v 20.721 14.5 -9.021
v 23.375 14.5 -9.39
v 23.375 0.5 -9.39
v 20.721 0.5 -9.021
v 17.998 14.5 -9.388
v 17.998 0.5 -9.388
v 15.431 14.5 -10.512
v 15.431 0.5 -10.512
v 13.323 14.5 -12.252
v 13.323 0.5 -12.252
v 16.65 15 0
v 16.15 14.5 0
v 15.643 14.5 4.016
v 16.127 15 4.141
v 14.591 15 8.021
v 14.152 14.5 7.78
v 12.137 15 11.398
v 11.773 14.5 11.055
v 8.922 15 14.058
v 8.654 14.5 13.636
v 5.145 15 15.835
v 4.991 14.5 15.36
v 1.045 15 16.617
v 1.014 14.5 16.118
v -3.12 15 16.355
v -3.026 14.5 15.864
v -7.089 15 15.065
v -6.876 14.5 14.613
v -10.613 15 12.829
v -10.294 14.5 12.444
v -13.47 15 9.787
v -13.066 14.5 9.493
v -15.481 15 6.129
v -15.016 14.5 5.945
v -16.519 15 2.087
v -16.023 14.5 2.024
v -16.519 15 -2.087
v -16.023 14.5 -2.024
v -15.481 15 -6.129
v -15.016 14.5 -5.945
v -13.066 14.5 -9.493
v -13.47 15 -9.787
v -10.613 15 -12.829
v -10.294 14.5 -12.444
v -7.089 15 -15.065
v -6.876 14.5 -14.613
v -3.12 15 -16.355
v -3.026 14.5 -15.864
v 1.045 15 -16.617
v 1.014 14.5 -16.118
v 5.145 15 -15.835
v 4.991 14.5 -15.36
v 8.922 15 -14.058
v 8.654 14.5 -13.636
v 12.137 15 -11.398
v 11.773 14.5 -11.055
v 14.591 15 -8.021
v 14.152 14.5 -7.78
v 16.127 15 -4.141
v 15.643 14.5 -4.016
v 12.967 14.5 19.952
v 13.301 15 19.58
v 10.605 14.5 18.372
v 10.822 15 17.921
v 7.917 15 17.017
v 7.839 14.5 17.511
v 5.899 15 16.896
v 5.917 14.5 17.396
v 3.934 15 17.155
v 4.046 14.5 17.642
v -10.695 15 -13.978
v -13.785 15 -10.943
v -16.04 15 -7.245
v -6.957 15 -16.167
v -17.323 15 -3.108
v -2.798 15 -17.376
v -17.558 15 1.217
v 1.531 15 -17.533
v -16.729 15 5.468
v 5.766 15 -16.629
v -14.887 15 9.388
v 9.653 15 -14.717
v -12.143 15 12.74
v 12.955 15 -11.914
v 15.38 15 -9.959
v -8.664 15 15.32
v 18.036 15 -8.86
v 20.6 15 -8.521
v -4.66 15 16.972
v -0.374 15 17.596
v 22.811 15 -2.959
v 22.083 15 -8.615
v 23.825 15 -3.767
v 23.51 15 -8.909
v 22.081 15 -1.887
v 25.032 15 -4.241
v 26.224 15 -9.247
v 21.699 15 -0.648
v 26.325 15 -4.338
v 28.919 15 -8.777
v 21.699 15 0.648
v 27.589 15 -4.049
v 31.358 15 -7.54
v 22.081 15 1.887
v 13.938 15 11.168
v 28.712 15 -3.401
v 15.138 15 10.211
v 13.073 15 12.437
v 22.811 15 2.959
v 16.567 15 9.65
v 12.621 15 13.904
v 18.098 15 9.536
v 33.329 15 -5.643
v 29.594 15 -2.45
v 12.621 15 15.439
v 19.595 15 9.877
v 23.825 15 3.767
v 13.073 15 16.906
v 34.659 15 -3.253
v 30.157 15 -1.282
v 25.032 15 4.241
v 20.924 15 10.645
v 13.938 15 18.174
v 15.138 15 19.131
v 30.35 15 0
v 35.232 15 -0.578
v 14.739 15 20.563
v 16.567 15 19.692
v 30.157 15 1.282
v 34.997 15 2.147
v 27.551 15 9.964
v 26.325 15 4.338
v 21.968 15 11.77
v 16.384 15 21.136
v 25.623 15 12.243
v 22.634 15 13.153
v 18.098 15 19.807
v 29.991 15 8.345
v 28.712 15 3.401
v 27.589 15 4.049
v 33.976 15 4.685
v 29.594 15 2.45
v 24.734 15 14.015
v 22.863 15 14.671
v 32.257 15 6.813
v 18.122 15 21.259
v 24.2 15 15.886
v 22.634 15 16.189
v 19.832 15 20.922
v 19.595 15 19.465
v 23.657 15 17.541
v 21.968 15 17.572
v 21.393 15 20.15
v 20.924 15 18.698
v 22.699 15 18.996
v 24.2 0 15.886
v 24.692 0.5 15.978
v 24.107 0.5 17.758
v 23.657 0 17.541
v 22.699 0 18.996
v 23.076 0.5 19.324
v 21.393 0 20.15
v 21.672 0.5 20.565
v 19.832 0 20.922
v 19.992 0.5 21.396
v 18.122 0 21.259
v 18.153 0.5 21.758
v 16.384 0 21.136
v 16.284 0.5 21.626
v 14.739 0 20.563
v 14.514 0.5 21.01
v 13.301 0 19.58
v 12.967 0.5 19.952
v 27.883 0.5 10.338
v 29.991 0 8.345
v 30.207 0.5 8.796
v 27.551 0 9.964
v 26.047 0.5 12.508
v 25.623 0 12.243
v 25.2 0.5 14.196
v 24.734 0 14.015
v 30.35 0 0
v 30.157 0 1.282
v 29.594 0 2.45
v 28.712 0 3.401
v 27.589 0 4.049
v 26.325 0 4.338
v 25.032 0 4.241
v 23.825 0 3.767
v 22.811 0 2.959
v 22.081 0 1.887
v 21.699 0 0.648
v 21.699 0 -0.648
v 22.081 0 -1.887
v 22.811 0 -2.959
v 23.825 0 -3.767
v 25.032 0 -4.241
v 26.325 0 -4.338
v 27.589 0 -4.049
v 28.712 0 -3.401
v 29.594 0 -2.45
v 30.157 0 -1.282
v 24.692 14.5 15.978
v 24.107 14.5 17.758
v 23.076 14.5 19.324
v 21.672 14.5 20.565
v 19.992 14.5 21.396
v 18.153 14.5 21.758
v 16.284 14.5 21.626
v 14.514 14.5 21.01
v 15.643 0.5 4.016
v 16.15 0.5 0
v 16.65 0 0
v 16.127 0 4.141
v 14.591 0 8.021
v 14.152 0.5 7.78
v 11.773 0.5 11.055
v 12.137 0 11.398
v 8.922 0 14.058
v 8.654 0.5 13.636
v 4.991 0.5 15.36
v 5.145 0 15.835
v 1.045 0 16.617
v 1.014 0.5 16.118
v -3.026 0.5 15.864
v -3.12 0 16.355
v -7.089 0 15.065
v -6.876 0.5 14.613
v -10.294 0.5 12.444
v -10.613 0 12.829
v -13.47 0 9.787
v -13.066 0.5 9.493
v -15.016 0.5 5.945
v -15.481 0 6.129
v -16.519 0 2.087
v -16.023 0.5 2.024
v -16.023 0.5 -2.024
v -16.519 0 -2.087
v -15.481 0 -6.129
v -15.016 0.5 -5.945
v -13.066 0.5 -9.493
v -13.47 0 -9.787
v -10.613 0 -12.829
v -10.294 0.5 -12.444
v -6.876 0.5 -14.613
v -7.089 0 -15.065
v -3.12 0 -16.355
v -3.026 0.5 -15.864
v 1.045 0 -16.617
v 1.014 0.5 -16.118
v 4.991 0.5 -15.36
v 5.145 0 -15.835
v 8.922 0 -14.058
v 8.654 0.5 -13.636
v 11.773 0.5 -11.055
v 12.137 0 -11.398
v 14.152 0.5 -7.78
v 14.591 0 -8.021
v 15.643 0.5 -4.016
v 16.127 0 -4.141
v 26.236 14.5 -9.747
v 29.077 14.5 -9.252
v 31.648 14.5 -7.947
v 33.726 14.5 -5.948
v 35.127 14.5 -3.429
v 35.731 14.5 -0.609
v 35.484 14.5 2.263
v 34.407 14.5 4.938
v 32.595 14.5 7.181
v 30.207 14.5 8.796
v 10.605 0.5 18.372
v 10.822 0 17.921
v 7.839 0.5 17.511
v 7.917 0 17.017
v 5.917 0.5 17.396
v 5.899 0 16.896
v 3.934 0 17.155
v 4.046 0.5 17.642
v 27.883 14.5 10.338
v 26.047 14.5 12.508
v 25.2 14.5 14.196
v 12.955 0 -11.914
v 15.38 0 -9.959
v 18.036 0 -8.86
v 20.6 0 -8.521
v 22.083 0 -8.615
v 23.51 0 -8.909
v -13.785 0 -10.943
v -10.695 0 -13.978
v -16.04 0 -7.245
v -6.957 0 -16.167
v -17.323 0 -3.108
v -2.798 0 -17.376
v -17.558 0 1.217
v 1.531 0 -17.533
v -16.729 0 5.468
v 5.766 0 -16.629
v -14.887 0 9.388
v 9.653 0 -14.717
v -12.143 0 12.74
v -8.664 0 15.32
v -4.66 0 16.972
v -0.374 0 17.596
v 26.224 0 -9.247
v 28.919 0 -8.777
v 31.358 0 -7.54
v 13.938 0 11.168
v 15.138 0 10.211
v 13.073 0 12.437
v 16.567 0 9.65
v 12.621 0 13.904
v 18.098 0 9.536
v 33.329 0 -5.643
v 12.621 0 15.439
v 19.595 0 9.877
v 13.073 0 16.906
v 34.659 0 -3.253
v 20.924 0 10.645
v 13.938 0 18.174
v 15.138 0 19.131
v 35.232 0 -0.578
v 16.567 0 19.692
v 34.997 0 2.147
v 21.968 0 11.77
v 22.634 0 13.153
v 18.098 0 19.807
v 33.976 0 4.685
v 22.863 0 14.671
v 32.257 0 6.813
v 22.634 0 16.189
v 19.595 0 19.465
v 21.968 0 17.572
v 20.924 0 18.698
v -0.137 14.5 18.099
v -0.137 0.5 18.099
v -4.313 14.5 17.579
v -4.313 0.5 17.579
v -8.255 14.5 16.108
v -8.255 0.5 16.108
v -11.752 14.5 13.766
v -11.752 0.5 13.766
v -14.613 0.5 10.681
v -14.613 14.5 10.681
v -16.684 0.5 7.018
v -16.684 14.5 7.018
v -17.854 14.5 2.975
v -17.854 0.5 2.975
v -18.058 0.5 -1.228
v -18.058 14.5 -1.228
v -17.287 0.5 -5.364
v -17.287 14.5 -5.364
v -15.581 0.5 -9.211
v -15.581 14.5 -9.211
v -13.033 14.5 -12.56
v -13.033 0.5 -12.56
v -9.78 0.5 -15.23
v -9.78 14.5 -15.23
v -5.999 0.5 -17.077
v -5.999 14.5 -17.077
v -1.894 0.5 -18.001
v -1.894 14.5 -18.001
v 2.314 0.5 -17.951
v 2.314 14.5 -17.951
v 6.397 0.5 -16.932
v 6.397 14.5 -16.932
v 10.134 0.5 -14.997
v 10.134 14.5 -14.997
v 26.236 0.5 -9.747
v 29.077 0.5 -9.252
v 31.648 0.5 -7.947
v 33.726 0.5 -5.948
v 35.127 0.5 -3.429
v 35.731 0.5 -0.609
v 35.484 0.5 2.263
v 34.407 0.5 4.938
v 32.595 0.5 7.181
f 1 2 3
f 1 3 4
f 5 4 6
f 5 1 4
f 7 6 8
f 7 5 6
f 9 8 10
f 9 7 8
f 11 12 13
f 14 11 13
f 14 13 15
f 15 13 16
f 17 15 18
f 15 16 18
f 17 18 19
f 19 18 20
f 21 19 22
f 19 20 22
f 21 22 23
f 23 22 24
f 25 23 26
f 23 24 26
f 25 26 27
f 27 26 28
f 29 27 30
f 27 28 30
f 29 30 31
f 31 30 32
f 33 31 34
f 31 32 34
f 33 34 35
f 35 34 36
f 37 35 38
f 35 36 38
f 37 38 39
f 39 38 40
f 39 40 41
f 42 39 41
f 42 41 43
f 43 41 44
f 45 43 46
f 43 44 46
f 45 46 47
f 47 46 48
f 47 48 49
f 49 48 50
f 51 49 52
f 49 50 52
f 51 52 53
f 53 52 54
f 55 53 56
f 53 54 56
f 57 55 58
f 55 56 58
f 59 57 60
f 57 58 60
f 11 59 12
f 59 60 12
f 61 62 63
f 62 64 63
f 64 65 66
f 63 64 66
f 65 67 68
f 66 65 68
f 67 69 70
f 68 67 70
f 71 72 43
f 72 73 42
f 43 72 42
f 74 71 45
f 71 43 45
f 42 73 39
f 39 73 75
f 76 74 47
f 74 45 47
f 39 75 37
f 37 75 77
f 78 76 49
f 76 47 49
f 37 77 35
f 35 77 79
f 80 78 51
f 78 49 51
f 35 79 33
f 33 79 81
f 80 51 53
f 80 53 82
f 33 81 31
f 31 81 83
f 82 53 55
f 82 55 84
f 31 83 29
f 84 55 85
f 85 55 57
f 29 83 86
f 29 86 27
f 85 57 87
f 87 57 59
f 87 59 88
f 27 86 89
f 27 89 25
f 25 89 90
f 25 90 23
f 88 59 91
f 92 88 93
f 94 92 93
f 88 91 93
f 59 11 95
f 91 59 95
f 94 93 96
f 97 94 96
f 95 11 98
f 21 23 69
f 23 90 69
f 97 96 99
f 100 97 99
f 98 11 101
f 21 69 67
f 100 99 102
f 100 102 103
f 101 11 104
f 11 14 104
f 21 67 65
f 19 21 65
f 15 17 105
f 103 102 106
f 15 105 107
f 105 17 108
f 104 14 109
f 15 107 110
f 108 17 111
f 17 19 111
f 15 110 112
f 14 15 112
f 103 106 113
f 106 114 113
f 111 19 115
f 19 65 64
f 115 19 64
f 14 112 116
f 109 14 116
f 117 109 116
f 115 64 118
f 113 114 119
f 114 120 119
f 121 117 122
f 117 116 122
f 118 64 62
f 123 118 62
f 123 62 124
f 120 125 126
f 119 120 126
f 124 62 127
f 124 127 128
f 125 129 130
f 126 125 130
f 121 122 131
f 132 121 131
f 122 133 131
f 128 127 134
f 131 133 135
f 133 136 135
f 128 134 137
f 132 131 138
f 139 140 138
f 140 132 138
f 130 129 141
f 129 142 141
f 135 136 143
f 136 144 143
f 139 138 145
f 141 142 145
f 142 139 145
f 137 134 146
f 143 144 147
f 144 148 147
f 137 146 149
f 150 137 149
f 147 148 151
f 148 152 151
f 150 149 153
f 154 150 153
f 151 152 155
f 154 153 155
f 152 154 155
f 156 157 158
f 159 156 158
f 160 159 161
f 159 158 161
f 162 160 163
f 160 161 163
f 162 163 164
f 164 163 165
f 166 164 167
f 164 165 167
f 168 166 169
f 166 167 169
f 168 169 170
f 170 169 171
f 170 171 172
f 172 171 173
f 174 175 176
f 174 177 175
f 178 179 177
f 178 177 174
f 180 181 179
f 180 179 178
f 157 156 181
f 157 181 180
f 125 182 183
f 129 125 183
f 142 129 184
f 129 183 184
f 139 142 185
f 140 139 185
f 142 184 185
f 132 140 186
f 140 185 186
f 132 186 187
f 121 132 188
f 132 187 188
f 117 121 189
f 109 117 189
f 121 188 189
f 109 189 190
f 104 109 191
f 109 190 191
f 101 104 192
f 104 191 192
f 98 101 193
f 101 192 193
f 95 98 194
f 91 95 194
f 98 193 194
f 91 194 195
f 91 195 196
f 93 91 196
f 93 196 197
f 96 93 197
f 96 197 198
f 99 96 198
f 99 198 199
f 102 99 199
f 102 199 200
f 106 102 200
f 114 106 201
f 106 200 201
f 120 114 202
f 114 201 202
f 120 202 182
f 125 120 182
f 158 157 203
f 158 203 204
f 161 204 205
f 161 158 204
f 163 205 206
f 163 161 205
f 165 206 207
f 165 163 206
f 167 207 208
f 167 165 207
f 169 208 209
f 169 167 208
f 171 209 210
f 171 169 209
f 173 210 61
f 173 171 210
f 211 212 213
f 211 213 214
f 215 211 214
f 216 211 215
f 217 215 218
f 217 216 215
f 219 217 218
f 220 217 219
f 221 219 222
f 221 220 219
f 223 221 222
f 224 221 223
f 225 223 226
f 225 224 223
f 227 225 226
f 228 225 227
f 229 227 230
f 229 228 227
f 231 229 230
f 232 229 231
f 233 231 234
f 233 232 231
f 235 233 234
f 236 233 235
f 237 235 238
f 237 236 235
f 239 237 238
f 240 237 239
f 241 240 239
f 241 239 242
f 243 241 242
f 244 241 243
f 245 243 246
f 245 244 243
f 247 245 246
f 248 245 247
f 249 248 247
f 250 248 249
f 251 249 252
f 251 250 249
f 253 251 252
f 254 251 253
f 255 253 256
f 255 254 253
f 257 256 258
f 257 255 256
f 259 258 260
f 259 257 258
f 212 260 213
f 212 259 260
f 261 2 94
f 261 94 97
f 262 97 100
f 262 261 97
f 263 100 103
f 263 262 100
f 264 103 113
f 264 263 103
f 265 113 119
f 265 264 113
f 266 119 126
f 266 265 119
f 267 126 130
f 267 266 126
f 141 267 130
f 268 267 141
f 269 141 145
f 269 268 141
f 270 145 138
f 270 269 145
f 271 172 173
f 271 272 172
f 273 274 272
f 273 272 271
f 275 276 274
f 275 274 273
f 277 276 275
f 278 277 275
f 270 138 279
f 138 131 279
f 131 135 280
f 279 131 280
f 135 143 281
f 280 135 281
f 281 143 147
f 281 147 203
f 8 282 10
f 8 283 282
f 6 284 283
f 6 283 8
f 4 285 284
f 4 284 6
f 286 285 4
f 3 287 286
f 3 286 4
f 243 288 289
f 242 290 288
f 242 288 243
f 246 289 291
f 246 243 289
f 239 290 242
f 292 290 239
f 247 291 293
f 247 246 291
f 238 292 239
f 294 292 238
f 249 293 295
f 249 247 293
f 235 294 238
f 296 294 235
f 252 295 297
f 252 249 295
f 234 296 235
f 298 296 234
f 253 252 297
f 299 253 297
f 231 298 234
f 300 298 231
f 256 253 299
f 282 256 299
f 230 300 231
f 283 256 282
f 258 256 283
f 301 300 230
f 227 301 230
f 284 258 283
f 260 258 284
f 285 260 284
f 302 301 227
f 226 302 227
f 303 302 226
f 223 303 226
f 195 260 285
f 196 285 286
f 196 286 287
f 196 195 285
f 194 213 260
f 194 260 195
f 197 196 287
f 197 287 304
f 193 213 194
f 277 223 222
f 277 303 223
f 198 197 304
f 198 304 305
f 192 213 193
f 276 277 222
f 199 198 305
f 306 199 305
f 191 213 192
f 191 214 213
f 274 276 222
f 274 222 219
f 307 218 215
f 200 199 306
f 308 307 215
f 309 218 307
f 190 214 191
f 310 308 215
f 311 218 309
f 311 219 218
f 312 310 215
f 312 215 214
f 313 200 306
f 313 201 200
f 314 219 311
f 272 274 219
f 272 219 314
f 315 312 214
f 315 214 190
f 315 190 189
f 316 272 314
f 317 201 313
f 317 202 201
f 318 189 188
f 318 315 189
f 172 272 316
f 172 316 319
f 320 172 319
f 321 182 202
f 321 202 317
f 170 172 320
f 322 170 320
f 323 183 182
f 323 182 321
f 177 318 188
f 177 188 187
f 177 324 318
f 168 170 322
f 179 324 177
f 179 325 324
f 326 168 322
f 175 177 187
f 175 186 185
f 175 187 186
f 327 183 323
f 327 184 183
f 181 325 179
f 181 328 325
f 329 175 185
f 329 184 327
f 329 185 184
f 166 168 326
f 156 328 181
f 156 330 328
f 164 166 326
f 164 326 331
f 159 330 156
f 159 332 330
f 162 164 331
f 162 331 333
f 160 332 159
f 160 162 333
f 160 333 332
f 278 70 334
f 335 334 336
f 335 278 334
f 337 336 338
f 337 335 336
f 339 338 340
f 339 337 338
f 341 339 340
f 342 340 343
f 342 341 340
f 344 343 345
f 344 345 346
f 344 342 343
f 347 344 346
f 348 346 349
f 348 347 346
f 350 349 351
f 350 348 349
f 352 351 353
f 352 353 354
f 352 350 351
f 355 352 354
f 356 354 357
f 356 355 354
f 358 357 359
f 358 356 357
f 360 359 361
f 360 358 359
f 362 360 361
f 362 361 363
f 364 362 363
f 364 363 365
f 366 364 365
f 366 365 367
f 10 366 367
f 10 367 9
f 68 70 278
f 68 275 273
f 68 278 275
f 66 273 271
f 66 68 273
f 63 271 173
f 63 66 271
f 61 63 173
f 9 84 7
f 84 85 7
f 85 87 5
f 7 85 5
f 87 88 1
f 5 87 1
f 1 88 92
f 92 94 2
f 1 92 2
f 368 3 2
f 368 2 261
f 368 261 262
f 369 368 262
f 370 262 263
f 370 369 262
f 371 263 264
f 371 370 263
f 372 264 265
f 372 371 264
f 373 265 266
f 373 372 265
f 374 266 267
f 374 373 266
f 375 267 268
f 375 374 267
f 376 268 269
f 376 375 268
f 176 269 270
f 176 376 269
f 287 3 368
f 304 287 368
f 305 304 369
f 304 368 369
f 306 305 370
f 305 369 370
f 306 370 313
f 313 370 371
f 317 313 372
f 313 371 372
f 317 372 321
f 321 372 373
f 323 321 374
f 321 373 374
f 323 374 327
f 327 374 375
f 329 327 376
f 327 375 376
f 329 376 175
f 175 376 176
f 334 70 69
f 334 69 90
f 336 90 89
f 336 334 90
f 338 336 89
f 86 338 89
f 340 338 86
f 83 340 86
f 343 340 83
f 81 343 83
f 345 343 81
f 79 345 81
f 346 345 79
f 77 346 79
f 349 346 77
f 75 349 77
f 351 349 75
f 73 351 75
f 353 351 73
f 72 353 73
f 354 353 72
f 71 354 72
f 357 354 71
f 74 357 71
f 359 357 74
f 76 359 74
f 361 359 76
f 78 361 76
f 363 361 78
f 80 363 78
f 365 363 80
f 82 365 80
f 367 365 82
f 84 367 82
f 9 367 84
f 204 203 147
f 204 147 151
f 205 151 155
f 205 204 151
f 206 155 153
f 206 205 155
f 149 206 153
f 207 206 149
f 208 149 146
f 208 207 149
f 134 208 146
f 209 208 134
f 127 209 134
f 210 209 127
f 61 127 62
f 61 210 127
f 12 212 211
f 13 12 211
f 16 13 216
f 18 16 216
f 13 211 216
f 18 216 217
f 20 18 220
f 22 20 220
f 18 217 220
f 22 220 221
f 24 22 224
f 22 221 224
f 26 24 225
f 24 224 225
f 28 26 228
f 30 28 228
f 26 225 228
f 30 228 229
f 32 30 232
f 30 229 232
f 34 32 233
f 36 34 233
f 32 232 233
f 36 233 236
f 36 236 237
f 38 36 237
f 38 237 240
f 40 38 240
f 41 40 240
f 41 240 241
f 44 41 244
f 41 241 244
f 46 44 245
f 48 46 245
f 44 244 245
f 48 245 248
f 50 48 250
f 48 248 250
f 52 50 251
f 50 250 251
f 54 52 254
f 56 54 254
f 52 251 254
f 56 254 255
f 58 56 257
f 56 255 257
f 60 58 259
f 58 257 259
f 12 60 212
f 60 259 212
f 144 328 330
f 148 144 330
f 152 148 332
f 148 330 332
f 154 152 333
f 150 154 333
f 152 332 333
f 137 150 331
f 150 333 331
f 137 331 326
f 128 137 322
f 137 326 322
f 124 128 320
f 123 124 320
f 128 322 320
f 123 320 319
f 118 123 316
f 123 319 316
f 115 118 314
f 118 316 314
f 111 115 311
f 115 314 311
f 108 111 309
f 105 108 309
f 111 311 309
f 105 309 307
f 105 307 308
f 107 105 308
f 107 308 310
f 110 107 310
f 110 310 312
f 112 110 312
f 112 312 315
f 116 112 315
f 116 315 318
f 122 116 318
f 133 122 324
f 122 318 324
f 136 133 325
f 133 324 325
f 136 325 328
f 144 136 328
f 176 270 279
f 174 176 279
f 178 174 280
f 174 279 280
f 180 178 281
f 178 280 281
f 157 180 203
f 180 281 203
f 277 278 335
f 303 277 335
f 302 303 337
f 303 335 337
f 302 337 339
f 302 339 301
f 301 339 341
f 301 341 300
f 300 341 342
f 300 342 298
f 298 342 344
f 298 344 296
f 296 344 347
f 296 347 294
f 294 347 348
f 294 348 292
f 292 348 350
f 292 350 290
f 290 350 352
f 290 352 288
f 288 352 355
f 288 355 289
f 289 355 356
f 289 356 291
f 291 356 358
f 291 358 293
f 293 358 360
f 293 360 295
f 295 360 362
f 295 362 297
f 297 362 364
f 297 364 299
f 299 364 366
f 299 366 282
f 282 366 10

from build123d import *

# Parameters (mm, degrees)
F0_R     = 16.15
F0_R_2   = 4.35
F0_R_3   = 5.15
F1_DEPTH = 15
F2_R     = 10
F3_SIZE  = 0.5


with BuildPart() as f1:
    # F0 (on Front) → F1 (new body)
    with BuildSketch(Plane.XZ):
        with BuildLine():
            ThreePointArc((17.472067, -4.726189), (35.382893, -2.650248), (21.204868, 8.489359))
            ThreePointArc((21.204868, 8.489359), (21.28794, 20.805684), (10.613035, 14.661974))
            ThreePointArc((10.613035, 14.661974), (-17.063659, -6.036683), (17.472067, -4.726189))
        make_face()
        Circle(F0_R, mode=Mode.SUBTRACT)
        with Locations((26, 0)):
            Circle(F0_R_2, mode=Mode.SUBTRACT)
        with Locations((17.713029, 14.671353)):
            Circle(F0_R_3, mode=Mode.SUBTRACT)
    extrude(amount=-F1_DEPTH)

    # F2
    f2_edges = [f1.edges().sort_by_distance(p)[0] for p in [
        (10.613035, 7.5, 14.661974),
        (21.204868, 7.5, 8.489359),
        (17.472067, 7.5, -4.726189),
    ]]
    fillet(f2_edges, radius=F2_R)

    # F3
    f3_edges = [f1.edges().sort_by_distance(p)[0] for p in [
        (-17.286785, 0, -5.364427),
        (-17.286785, 15, -5.364427),
        (-16.15, 15, 0),
        (-16.15, 0, 0),
    ]]
    chamfer(f3_edges, length=F3_SIZE)


solid = f1.part
